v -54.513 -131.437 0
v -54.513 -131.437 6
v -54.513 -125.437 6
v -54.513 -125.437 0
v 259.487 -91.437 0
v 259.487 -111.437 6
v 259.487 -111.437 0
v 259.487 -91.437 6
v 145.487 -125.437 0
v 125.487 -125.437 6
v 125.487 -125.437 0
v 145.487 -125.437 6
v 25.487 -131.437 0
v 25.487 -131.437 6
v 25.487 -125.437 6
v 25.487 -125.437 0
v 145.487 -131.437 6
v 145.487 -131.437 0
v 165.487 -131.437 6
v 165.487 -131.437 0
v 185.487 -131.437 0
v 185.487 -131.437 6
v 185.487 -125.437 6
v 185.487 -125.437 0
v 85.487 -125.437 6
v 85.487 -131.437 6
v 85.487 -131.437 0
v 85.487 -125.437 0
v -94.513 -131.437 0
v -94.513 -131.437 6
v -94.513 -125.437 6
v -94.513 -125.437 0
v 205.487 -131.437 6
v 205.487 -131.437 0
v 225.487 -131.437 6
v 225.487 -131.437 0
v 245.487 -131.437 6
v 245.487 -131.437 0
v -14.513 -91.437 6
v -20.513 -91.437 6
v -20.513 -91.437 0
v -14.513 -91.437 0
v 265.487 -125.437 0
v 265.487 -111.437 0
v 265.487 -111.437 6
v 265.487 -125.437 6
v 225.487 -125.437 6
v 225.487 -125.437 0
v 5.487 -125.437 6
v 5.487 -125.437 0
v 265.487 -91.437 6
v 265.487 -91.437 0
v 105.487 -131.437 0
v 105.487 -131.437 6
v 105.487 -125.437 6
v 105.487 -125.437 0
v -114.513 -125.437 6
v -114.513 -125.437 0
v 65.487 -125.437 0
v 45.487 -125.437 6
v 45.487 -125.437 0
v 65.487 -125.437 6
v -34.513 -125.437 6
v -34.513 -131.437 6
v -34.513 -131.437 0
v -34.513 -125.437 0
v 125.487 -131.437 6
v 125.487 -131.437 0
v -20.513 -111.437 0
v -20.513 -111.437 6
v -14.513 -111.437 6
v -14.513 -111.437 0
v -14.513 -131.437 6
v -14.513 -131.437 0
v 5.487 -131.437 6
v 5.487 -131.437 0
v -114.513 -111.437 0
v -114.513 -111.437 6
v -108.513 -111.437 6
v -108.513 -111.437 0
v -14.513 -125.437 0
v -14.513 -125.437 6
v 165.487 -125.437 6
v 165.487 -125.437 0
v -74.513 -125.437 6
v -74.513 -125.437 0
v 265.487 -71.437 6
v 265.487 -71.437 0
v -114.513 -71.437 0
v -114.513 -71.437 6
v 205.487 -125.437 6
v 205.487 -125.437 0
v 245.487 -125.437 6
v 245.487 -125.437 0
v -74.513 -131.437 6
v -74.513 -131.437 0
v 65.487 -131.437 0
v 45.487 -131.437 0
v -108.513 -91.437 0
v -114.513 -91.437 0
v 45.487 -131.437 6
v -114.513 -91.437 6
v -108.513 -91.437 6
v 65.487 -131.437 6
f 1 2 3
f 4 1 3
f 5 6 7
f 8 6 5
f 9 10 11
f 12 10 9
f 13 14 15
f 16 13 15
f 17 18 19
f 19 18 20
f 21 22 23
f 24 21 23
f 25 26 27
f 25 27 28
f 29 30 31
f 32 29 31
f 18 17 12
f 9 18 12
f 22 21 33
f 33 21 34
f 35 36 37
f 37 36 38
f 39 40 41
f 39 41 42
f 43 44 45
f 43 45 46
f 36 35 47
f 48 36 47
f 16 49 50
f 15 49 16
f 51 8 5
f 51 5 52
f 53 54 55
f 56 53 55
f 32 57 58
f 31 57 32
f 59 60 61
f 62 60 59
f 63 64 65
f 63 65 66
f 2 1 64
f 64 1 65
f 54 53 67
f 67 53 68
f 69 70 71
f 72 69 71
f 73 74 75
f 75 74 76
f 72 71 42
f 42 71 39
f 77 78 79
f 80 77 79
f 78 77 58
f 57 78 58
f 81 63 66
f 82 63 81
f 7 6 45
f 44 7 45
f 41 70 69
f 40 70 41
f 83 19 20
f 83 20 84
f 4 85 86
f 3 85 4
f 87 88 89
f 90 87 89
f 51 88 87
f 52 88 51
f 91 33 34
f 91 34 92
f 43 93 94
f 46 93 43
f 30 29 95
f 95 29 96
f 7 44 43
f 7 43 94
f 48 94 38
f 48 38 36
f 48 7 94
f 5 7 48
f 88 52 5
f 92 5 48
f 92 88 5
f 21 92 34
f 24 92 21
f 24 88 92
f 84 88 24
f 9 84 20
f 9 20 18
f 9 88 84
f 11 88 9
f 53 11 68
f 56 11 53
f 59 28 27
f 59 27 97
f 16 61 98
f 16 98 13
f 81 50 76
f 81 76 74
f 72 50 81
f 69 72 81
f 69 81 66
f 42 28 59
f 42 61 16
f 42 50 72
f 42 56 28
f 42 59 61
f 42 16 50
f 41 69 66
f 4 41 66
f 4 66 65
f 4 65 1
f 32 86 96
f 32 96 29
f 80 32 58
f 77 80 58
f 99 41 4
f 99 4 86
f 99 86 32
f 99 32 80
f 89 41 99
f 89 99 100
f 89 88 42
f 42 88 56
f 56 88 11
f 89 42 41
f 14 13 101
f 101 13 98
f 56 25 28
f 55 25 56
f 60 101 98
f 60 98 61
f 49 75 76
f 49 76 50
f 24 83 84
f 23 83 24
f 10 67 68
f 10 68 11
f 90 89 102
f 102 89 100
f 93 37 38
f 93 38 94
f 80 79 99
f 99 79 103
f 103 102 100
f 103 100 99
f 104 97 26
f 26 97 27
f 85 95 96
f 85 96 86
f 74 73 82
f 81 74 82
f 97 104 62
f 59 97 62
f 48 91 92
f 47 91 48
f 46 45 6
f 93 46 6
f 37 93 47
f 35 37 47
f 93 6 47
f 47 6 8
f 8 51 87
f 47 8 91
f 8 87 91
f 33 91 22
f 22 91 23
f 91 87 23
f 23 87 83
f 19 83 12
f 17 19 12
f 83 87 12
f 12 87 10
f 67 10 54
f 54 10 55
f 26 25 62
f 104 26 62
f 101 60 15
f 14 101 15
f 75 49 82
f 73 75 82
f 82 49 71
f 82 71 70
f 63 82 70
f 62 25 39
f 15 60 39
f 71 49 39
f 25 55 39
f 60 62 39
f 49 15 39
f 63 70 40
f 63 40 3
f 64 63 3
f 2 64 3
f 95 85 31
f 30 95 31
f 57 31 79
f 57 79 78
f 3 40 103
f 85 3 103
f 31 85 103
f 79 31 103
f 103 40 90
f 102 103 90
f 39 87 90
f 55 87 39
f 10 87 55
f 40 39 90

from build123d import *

# Parameters (mm, degrees)
BOSS_EXTRUDE1_DEPTH = 6
SKETCH2_W           = 6
SKETCH2_H           = 20
CUT_EXTRUDE1_DEPTH  = 10
SKETCH3_W           = 6
SKETCH3_H           = 20
CUT_EXTRUDE2_DEPTH  = 10
SKETCH4_W           = 20
SKETCH4_H           = 6
CUT_EXTRUDE3_DEPTH  = 10
LPATTERN1_COUNT     = 10
LPATTERN1_PITCH     = 40
SKETCH5_W           = 6
SKETCH5_H           = 20
CUT_EXTRUDE4_DEPTH  = 10


with BuildPart() as part:
    # Sketch1 → Boss-Extrude1 (new body)
    with BuildSketch(Plane.XY):
        Polygon((-114.513362239, -81.437063232), (-114.513362239, -71.437063232), (-14.513362239, -71.437063232), (265.486637761, -71.437063232), (265.486637761, -131.437063232), (-14.513362239, -131.437063232), (-114.513362239, -131.437063232), align=None)
    extrude(amount=BOSS_EXTRUDE1_DEPTH)

    # Sketch2 → Cut-Extrude1 (cut)
    with BuildSketch(Plane.XY.offset(6)):
        with Locations((-111.513362239, -101.437063232)):
            Rectangle(SKETCH2_W, SKETCH2_H)
    extrude(amount=-CUT_EXTRUDE1_DEPTH, mode=Mode.SUBTRACT)

    # Sketch3 → Cut-Extrude2 (cut)
    with BuildSketch(Plane.XY.offset(6)):
        with Locations((-17.513362239, -101.437063232)):
            Rectangle(SKETCH3_W, SKETCH3_H)
    extrude(amount=-CUT_EXTRUDE2_DEPTH, mode=Mode.SUBTRACT)

    # Sketch4 → Cut-Extrude3 (cut)
    with BuildSketch(Plane.XY.offset(6)):
        with Locations((-104.513362239, -128.437063232)):
            Rectangle(SKETCH4_W, SKETCH4_H)
    cut_extrude3 = extrude(amount=-CUT_EXTRUDE3_DEPTH, mode=Mode.SUBTRACT)

    # LPattern1: Cut-Extrude3 ×10
    with Locations(*[(i * LPATTERN1_PITCH, 0, 0) for i in range(1, LPATTERN1_COUNT)]):
        add(cut_extrude3, mode=Mode.SUBTRACT)

    # Sketch5 → Cut-Extrude4 (cut)
    with BuildSketch(Plane.XY.offset(6)):
        with Locations((262.486637761, -101.437063232)):
            Rectangle(SKETCH5_W, SKETCH5_H)
    extrude(amount=-CUT_EXTRUDE4_DEPTH, mode=Mode.SUBTRACT)


solid = part.part
